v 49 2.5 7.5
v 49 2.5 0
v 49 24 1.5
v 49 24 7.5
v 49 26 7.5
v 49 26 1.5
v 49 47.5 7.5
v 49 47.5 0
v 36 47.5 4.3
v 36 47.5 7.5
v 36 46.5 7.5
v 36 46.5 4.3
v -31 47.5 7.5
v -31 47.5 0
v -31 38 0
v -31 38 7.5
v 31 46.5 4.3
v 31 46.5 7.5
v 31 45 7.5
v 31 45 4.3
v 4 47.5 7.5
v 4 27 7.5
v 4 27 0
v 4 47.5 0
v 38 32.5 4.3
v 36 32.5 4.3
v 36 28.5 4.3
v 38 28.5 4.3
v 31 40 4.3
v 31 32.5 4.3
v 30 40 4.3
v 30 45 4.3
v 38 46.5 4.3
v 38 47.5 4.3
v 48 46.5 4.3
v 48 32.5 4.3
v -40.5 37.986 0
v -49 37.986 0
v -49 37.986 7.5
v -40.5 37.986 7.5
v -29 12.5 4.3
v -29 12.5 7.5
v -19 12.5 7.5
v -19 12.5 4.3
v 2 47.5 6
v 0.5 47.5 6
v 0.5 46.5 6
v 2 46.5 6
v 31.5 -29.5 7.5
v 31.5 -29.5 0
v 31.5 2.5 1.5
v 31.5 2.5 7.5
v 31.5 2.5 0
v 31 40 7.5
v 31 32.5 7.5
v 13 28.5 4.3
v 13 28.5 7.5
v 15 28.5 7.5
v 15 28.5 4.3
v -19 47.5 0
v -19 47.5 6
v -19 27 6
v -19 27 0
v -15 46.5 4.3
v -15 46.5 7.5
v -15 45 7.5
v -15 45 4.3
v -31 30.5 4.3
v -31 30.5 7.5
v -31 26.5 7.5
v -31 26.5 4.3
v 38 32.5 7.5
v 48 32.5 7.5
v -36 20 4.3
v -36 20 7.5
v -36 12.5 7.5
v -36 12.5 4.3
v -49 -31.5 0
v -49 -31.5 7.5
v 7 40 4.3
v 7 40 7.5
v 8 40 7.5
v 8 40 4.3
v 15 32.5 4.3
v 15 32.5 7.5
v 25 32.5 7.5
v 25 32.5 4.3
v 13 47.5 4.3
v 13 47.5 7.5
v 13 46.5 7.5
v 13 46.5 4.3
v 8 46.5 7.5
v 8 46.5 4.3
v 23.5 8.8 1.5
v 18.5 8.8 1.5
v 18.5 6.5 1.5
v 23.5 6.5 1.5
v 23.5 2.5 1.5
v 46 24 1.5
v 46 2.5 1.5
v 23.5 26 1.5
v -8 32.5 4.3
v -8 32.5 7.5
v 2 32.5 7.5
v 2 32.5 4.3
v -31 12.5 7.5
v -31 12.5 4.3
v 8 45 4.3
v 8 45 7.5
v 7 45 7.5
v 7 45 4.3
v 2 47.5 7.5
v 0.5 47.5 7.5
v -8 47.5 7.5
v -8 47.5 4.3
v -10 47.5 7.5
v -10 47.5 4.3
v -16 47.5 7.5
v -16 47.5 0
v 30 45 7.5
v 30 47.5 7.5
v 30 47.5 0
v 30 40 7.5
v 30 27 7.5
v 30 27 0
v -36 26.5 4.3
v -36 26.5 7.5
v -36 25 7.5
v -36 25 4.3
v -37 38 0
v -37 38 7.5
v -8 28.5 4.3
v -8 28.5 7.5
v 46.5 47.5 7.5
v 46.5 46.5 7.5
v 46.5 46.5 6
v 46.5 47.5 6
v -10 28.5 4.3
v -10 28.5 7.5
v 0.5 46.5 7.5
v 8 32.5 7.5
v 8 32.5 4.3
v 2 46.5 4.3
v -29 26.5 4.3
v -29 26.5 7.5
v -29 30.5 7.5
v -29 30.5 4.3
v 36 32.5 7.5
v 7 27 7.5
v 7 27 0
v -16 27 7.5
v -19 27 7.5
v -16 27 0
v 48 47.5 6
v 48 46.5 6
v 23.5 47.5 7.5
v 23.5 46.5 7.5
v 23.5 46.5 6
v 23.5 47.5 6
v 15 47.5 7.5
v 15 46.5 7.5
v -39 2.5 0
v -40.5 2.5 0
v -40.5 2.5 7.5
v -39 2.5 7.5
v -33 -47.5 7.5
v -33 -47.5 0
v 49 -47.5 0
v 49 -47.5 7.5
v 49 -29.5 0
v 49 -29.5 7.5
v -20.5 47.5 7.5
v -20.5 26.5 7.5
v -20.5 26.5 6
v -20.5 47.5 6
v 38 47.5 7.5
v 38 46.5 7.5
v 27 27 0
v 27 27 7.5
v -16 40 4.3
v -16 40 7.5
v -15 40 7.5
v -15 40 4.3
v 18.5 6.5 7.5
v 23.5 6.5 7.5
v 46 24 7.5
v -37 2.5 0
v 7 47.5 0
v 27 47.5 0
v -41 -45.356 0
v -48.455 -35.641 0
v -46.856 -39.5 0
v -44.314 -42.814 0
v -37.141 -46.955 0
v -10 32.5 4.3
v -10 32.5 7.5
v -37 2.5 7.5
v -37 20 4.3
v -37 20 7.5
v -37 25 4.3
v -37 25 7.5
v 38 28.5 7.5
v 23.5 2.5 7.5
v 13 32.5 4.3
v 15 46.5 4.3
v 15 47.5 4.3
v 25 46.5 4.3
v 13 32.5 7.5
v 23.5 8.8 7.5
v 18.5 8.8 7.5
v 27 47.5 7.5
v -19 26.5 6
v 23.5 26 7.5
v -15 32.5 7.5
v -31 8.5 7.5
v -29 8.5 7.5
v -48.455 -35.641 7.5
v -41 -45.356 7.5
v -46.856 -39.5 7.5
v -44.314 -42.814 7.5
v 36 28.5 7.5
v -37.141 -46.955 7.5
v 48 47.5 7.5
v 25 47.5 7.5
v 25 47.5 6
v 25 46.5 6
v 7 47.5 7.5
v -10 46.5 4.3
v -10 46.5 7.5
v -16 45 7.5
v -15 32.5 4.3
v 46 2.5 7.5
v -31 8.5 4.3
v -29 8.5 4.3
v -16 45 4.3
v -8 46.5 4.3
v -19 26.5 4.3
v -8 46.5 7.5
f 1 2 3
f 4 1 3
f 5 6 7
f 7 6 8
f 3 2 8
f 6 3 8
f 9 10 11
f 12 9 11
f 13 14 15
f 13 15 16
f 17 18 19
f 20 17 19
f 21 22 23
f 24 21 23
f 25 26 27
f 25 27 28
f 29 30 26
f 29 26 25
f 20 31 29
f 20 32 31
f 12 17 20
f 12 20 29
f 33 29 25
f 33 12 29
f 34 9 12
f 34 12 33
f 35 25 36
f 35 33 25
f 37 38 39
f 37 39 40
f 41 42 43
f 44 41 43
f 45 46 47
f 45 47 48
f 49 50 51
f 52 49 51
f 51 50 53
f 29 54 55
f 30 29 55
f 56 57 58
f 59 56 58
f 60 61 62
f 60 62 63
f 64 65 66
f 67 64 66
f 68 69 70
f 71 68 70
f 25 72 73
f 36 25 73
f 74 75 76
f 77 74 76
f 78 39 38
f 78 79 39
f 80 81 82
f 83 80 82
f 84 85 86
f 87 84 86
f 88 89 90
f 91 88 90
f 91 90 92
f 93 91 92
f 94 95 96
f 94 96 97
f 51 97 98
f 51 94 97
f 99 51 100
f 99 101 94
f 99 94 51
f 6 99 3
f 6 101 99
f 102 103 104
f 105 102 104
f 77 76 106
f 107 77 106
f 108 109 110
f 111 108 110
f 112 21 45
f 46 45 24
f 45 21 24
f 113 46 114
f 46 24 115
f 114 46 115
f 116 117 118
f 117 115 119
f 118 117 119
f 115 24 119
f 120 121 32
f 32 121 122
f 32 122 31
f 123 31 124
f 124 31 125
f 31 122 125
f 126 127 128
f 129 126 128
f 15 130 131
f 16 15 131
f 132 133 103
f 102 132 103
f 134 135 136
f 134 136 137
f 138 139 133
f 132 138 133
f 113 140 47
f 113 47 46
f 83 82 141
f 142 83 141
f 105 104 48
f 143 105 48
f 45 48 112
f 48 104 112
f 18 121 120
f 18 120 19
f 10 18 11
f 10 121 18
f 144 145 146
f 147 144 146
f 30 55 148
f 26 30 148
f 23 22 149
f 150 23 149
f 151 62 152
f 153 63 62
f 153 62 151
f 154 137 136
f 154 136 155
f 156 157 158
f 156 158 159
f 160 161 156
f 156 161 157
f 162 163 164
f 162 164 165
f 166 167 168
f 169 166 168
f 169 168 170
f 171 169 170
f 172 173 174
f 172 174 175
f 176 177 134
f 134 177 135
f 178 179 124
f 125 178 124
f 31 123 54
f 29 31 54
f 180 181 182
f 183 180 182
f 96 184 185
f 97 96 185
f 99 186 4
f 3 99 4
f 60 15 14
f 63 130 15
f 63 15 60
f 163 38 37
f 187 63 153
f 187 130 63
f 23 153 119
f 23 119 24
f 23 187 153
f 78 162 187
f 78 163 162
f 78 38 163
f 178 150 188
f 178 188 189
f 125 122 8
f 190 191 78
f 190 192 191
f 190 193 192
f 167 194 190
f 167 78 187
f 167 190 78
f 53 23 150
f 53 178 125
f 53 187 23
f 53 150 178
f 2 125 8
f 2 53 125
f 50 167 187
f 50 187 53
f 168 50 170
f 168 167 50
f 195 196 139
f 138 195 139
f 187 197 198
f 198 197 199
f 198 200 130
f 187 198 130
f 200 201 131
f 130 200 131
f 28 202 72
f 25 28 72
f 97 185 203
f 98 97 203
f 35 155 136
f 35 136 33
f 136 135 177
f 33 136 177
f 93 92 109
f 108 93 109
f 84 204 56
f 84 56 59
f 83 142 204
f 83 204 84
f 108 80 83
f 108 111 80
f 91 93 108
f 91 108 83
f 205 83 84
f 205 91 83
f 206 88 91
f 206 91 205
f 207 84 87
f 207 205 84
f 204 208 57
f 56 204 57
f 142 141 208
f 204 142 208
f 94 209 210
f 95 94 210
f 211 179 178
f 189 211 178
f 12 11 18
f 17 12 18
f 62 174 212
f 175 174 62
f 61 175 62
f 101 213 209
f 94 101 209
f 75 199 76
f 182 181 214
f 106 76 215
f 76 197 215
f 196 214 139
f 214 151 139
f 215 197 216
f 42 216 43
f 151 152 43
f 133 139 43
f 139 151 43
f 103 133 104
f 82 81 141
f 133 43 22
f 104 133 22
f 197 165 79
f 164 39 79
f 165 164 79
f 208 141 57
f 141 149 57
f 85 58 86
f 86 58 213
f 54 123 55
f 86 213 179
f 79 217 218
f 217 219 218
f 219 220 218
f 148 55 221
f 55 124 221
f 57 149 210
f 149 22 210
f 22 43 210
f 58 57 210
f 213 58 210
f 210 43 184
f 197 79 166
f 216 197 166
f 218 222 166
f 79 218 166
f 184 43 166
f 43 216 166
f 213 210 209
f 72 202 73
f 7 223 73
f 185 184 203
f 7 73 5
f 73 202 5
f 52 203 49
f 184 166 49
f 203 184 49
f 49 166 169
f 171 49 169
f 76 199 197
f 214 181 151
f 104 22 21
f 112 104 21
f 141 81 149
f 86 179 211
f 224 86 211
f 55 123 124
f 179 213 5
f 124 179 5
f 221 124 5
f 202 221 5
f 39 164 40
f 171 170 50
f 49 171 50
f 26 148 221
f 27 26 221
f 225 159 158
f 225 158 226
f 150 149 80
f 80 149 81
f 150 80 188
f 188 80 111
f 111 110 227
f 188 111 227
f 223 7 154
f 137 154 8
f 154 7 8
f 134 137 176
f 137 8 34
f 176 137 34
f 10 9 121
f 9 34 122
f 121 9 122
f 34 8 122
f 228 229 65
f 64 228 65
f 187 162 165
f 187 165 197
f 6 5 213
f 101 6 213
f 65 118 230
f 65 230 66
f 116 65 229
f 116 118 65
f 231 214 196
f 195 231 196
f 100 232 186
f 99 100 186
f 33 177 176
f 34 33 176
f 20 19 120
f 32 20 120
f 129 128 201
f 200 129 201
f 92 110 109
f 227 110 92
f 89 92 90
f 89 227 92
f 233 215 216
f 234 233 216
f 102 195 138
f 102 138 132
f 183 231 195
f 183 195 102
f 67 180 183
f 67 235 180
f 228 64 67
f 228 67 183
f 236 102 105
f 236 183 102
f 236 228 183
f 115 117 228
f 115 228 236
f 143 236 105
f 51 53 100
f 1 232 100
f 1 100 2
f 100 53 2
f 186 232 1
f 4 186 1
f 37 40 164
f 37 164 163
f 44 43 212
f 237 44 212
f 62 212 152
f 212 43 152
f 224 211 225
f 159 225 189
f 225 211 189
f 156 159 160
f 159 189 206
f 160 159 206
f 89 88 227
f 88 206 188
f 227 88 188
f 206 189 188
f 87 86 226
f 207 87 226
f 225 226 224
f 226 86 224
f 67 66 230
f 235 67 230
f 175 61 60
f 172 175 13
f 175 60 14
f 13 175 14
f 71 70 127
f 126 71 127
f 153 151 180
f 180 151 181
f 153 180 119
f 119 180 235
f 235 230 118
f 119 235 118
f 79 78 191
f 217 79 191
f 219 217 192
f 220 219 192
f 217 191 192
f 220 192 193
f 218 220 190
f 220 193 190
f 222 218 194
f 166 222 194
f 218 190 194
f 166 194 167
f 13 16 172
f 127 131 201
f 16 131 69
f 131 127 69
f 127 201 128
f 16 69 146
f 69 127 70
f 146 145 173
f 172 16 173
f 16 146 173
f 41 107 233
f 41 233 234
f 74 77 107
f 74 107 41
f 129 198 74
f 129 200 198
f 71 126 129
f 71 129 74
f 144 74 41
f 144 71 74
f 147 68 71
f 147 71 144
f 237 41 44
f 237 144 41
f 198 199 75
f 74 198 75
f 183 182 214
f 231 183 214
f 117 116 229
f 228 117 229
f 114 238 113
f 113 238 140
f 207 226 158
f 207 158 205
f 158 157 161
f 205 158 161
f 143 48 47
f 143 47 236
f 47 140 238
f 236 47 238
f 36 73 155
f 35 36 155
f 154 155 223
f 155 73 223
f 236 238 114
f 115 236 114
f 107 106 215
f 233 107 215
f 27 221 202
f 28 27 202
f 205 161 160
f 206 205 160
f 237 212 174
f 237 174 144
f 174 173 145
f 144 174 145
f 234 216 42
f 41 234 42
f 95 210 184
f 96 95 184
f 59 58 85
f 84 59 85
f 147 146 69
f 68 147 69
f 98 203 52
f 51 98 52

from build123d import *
from OCP.BRepAlgoAPI import BRepAlgoAPI_Cut
from OCP.TopTools import TopTools_ListOfShape
from build123d.topology import SkipClean

# Parameters (mm, degrees)
BOSS_EXTRUDE1_DEPTH = 7.5
CUT_EXTRUDE1_DEPTH  = 3.2
CUT_EXTRUDE4_REACH  = 70.655
SKETCH5_W           = 3
SKETCH5_H           = 17
CUT_EXTRUDE5_REACH  = 70.655
SKETCH8_W           = 12
SKETCH8_H           = 37
CUT_EXTRUDE6_DEPTH  = 3.2
SKETCH10_W          = 10
SKETCH10_H          = 7.5
BOSS_EXTRUDE2_DEPTH = 27.486353186
SKETCH11_W          = 3
SKETCH11_H          = 7.5
CUT_EXTRUDE7_DEPTH  = 3.5
SKETCH12_W          = 2
SKETCH12_H          = 7.5
CUT_EXTRUDE8_DEPTH  = 4
SKETCH13_W          = 2
SKETCH13_H          = 7.5
CUT_EXTRUDE9_DEPTH  = 4
SKETCH14_W          = 7.5
SKETCH14_H          = 9.5
CUT_EXTRUDE10_DEPTH = 6
SKETCH15_W          = 1.5
SKETCH15_H          = 21
SKETCH15_H_2        = 1
CUT_EXTRUDE11_DEPTH = 1.5
SKETCH16_W          = 1.5
SKETCH16_H          = 7.5
CUT_EXTRUDE12_DEPTH = 35.486360958
CUT_EXTRUDE13_DEPTH = 6


with BuildPart() as part:
    # Sketch1 → Boss-Extrude1 (new body)
    with BuildSketch(Plane.XY):
        with BuildLine():
            Line((-33, -47.5), (49, -47.5))
            Line((49, -47.5), (49, -29.5))
            Line((49, -29.5), (31.5, -29.5))
            Line((31.5, -29.5), (31.5, 2.5))
            Line((31.5, 2.5), (49, 2.5))
            Line((49, 2.5), (49, 47.5))
            Line((49, 47.5), (30, 47.5))
            Line((30, 47.5), (30, 30.5))
            Line((30, 30.5), (27, 30.5))
            Line((27, 30.5), (27, 47.5))
            Line((27, 47.5), (-49, 47.5))
            Line((-49, 47.5), (-49, -31.5))
            ThreePointArc((-49, -31.5), (-44.313708499, -42.813708499), (-33, -47.5))
        make_face()
    extrude(amount=BOSS_EXTRUDE1_DEPTH)

    # Sketch2 → Cut-Extrude1 (cut)
    with BuildSketch(Plane.XY.offset(7.5)):
        Polygon((30, 40), (31, 40), (31, 32.5), (36, 32.5), (36, 28.5), (38, 28.5), (38, 32.5), (48, 32.5), (48, 46.5), (38, 46.5), (38, 47.5), (36, 47.5), (36, 46.5), (31, 46.5), (31, 45), (30, 45), align=None)
        Polygon((-16, 40), (-15, 40), (-15, 32.5), (-10, 32.5), (-10, 28.5), (-8, 28.5), (-8, 32.5), (2, 32.5), (2, 46.5), (-8, 46.5), (-8, 47.5), (-10, 47.5), (-10, 46.5), (-15, 46.5), (-15, 45), (-16, 45), align=None)
        Polygon((7, 40), (8, 40), (8, 32.5), (13, 32.5), (13, 28.5), (15, 28.5), (15, 32.5), (25, 32.5), (25, 46.5), (15, 46.5), (15, 47.5), (13, 47.5), (13, 46.5), (8, 46.5), (8, 45), (7, 45), align=None)
    extrude(amount=-CUT_EXTRUDE1_DEPTH, mode=Mode.SUBTRACT)

    # Sketch5 → Cut-Extrude4 (cut, up to next)
    with BuildSketch(Plane.XY.offset(7.5), mode=Mode.PRIVATE) as cut_extrude4_sk1:
        with Locations((5.5, 39)):
            Rectangle(SKETCH5_W, SKETCH5_H)
    cut_extrude4_tool1 = extrude(cut_extrude4_sk1.sketch, amount=-CUT_EXTRUDE4_REACH, mode=Mode.PRIVATE) & part.part
    # Sketch5 → Cut-Extrude4 (cut, up to next)
    with BuildSketch(Plane.XY.offset(7.5), mode=Mode.PRIVATE) as cut_extrude4_sk2:
        with Locations((-17.5, 39)):
            Rectangle(SKETCH5_W, SKETCH5_H)
    cut_extrude4_tool2 = extrude(cut_extrude4_sk2.sketch, amount=-CUT_EXTRUDE4_REACH, mode=Mode.PRIVATE) & part.part
    add(cut_extrude4_tool1.solids().sort_by_distance((5.5, 39, 7.5))[0], mode=Mode.SUBTRACT)
    add(cut_extrude4_tool2.solids().sort_by_distance((-17.5, 39, 7.5))[0], mode=Mode.SUBTRACT)

    # Sketch8 → Cut-Extrude5 (cut, up to next)
    with BuildSketch(Plane.XY.offset(7.5), mode=Mode.PRIVATE) as cut_extrude5_sk1:
        with Locations((-43, 29)):
            Rectangle(SKETCH8_W, SKETCH8_H)
    cut_extrude5_tool1 = extrude(cut_extrude5_sk1.sketch, amount=-CUT_EXTRUDE5_REACH, mode=Mode.PRIVATE) & part.part
    add(cut_extrude5_tool1.solids().sort_by_distance((-43, 29, 7.5))[0], mode=Mode.SUBTRACT)

    # Sketch9 → Cut-Extrude6 (cut)
    with BuildSketch(Plane.XY.offset(7.5)):
        Polygon((-37, 20), (-36, 20), (-36, 12.5), (-31, 12.5), (-31, 8.5), (-29, 8.5), (-29, 12.5), (-19, 12.5), (-19, 26.5), (-29, 26.5), (-29, 30.5), (-31, 30.5), (-31, 26.5), (-36, 26.5), (-36, 25), (-37, 25), align=None)
    extrude(amount=-CUT_EXTRUDE6_DEPTH, mode=Mode.SUBTRACT)

    # Sketch10 → Boss-Extrude2 (add)
    with BuildSketch(Plane(origin=(0, 10.5, 0), x_dir=(1, 0, 0), z_dir=(0, 1, 0))):
        with Locations((-44, -3.75)):
            Rectangle(SKETCH10_W, SKETCH10_H)
    extrude(amount=BOSS_EXTRUDE2_DEPTH)

    # Sketch11 → Cut-Extrude7 (cut)
    with BuildSketch(Plane(origin=(0, 30.5, 0), x_dir=(1, 0, 0), z_dir=(0, 1, 0))):
        with Locations((-17.5, -3.75)):
            Rectangle(SKETCH11_W, SKETCH11_H)
        with Locations((5.5, -3.75)):
            Rectangle(SKETCH11_W, SKETCH11_H)
        with Locations((28.5, -3.75)):
            Rectangle(SKETCH11_W, SKETCH11_H)
    extrude(amount=-CUT_EXTRUDE7_DEPTH, mode=Mode.SUBTRACT)

    # Sketch12 → Cut-Extrude8 (cut)
    with BuildSketch(Plane(origin=(0, 10.5, 0), x_dir=(1, 0, 0), z_dir=(0, 1, 0))):
        with Locations((-38, -3.75)):
            Rectangle(SKETCH12_W, SKETCH12_H)
    extrude(amount=-CUT_EXTRUDE8_DEPTH, mode=Mode.SUBTRACT)

    # Sketch13 → Cut-Extrude9 (cut)
    with BuildSketch(Plane(origin=(0, 6.5, 0), x_dir=(1, 0, 0), z_dir=(0, 1, 0))):
        with Locations((-38, -3.75)):
            Rectangle(SKETCH13_W, SKETCH13_H)
    extrude(amount=-CUT_EXTRUDE9_DEPTH, mode=Mode.SUBTRACT)

    # Sketch14 → Cut-Extrude10 (cut)
    with BuildSketch(Plane.ZY.offset(37)):
        with Locations((3.75, 42.75)):
            Rectangle(SKETCH14_W, SKETCH14_H)
    extrude(amount=-CUT_EXTRUDE10_DEPTH, mode=Mode.SUBTRACT)

    # Sketch15 → Cut-Extrude11 (cut)
    with BuildSketch(Plane.XY.offset(7.5)):
        with Locations((-19.75, 37)):
            Rectangle(SKETCH15_W, SKETCH15_H)
        with Locations((1.25, 47)):
            Rectangle(SKETCH15_W, SKETCH15_H_2)
        with Locations((24.25, 47)):
            Rectangle(SKETCH15_W, SKETCH15_H_2)
        with Locations((47.25, 47)):
            Rectangle(SKETCH15_W, SKETCH15_H_2)
    extrude(amount=-CUT_EXTRUDE11_DEPTH, mode=Mode.SUBTRACT)


with BuildPart() as cut_extrude12_tool:
    # Sketch16 → Cut-Extrude12 (new body)
    with BuildSketch(Plane(origin=(0, 37.986353186, 0), x_dir=(1, 0, 0), z_dir=(0, 1, 0))):
        with Locations((-39.75, -3.75)):
            Rectangle(SKETCH16_W, SKETCH16_H)
    extrude(amount=-CUT_EXTRUDE12_DEPTH)


with BuildPart() as part_1:
    add(part.part)

    # Cut-Extrude12: cut by cut_extrude12_tool, with a tolerance
    cut_extrude12_stock = TopTools_ListOfShape()
    cut_extrude12_stock.Append(part_1.part.wrapped)
    cut_extrude12_tools = TopTools_ListOfShape()
    cut_extrude12_tools.Append(cut_extrude12_tool.part.wrapped)
    cut_extrude12_cut = BRepAlgoAPI_Cut()
    cut_extrude12_cut.SetArguments(cut_extrude12_stock)
    cut_extrude12_cut.SetTools(cut_extrude12_tools)
    cut_extrude12_cut.SetFuzzyValue(0.00001)
    cut_extrude12_cut.Build()
    add(Compound.cast(cut_extrude12_cut.Shape()).solids(), mode=Mode.REPLACE)

    # Sketch18 → Cut-Extrude13 (cut)
    with SkipClean():  # the faces are left unmerged after this step: merging them gives an invalid solid
        with BuildSketch(Plane.XY.offset(7.5)):
            Polygon((23.5, 6.5), (23.5, 2.5), (46, 2.5), (46, 24), (49, 24), (49, 26), (46, 26), (23.5, 26), (23.5, 8.8), (18.5, 8.8), (18.5, 6.5), align=None)
        extrude(amount=-CUT_EXTRUDE13_DEPTH, mode=Mode.SUBTRACT)


solid = part_1.part
